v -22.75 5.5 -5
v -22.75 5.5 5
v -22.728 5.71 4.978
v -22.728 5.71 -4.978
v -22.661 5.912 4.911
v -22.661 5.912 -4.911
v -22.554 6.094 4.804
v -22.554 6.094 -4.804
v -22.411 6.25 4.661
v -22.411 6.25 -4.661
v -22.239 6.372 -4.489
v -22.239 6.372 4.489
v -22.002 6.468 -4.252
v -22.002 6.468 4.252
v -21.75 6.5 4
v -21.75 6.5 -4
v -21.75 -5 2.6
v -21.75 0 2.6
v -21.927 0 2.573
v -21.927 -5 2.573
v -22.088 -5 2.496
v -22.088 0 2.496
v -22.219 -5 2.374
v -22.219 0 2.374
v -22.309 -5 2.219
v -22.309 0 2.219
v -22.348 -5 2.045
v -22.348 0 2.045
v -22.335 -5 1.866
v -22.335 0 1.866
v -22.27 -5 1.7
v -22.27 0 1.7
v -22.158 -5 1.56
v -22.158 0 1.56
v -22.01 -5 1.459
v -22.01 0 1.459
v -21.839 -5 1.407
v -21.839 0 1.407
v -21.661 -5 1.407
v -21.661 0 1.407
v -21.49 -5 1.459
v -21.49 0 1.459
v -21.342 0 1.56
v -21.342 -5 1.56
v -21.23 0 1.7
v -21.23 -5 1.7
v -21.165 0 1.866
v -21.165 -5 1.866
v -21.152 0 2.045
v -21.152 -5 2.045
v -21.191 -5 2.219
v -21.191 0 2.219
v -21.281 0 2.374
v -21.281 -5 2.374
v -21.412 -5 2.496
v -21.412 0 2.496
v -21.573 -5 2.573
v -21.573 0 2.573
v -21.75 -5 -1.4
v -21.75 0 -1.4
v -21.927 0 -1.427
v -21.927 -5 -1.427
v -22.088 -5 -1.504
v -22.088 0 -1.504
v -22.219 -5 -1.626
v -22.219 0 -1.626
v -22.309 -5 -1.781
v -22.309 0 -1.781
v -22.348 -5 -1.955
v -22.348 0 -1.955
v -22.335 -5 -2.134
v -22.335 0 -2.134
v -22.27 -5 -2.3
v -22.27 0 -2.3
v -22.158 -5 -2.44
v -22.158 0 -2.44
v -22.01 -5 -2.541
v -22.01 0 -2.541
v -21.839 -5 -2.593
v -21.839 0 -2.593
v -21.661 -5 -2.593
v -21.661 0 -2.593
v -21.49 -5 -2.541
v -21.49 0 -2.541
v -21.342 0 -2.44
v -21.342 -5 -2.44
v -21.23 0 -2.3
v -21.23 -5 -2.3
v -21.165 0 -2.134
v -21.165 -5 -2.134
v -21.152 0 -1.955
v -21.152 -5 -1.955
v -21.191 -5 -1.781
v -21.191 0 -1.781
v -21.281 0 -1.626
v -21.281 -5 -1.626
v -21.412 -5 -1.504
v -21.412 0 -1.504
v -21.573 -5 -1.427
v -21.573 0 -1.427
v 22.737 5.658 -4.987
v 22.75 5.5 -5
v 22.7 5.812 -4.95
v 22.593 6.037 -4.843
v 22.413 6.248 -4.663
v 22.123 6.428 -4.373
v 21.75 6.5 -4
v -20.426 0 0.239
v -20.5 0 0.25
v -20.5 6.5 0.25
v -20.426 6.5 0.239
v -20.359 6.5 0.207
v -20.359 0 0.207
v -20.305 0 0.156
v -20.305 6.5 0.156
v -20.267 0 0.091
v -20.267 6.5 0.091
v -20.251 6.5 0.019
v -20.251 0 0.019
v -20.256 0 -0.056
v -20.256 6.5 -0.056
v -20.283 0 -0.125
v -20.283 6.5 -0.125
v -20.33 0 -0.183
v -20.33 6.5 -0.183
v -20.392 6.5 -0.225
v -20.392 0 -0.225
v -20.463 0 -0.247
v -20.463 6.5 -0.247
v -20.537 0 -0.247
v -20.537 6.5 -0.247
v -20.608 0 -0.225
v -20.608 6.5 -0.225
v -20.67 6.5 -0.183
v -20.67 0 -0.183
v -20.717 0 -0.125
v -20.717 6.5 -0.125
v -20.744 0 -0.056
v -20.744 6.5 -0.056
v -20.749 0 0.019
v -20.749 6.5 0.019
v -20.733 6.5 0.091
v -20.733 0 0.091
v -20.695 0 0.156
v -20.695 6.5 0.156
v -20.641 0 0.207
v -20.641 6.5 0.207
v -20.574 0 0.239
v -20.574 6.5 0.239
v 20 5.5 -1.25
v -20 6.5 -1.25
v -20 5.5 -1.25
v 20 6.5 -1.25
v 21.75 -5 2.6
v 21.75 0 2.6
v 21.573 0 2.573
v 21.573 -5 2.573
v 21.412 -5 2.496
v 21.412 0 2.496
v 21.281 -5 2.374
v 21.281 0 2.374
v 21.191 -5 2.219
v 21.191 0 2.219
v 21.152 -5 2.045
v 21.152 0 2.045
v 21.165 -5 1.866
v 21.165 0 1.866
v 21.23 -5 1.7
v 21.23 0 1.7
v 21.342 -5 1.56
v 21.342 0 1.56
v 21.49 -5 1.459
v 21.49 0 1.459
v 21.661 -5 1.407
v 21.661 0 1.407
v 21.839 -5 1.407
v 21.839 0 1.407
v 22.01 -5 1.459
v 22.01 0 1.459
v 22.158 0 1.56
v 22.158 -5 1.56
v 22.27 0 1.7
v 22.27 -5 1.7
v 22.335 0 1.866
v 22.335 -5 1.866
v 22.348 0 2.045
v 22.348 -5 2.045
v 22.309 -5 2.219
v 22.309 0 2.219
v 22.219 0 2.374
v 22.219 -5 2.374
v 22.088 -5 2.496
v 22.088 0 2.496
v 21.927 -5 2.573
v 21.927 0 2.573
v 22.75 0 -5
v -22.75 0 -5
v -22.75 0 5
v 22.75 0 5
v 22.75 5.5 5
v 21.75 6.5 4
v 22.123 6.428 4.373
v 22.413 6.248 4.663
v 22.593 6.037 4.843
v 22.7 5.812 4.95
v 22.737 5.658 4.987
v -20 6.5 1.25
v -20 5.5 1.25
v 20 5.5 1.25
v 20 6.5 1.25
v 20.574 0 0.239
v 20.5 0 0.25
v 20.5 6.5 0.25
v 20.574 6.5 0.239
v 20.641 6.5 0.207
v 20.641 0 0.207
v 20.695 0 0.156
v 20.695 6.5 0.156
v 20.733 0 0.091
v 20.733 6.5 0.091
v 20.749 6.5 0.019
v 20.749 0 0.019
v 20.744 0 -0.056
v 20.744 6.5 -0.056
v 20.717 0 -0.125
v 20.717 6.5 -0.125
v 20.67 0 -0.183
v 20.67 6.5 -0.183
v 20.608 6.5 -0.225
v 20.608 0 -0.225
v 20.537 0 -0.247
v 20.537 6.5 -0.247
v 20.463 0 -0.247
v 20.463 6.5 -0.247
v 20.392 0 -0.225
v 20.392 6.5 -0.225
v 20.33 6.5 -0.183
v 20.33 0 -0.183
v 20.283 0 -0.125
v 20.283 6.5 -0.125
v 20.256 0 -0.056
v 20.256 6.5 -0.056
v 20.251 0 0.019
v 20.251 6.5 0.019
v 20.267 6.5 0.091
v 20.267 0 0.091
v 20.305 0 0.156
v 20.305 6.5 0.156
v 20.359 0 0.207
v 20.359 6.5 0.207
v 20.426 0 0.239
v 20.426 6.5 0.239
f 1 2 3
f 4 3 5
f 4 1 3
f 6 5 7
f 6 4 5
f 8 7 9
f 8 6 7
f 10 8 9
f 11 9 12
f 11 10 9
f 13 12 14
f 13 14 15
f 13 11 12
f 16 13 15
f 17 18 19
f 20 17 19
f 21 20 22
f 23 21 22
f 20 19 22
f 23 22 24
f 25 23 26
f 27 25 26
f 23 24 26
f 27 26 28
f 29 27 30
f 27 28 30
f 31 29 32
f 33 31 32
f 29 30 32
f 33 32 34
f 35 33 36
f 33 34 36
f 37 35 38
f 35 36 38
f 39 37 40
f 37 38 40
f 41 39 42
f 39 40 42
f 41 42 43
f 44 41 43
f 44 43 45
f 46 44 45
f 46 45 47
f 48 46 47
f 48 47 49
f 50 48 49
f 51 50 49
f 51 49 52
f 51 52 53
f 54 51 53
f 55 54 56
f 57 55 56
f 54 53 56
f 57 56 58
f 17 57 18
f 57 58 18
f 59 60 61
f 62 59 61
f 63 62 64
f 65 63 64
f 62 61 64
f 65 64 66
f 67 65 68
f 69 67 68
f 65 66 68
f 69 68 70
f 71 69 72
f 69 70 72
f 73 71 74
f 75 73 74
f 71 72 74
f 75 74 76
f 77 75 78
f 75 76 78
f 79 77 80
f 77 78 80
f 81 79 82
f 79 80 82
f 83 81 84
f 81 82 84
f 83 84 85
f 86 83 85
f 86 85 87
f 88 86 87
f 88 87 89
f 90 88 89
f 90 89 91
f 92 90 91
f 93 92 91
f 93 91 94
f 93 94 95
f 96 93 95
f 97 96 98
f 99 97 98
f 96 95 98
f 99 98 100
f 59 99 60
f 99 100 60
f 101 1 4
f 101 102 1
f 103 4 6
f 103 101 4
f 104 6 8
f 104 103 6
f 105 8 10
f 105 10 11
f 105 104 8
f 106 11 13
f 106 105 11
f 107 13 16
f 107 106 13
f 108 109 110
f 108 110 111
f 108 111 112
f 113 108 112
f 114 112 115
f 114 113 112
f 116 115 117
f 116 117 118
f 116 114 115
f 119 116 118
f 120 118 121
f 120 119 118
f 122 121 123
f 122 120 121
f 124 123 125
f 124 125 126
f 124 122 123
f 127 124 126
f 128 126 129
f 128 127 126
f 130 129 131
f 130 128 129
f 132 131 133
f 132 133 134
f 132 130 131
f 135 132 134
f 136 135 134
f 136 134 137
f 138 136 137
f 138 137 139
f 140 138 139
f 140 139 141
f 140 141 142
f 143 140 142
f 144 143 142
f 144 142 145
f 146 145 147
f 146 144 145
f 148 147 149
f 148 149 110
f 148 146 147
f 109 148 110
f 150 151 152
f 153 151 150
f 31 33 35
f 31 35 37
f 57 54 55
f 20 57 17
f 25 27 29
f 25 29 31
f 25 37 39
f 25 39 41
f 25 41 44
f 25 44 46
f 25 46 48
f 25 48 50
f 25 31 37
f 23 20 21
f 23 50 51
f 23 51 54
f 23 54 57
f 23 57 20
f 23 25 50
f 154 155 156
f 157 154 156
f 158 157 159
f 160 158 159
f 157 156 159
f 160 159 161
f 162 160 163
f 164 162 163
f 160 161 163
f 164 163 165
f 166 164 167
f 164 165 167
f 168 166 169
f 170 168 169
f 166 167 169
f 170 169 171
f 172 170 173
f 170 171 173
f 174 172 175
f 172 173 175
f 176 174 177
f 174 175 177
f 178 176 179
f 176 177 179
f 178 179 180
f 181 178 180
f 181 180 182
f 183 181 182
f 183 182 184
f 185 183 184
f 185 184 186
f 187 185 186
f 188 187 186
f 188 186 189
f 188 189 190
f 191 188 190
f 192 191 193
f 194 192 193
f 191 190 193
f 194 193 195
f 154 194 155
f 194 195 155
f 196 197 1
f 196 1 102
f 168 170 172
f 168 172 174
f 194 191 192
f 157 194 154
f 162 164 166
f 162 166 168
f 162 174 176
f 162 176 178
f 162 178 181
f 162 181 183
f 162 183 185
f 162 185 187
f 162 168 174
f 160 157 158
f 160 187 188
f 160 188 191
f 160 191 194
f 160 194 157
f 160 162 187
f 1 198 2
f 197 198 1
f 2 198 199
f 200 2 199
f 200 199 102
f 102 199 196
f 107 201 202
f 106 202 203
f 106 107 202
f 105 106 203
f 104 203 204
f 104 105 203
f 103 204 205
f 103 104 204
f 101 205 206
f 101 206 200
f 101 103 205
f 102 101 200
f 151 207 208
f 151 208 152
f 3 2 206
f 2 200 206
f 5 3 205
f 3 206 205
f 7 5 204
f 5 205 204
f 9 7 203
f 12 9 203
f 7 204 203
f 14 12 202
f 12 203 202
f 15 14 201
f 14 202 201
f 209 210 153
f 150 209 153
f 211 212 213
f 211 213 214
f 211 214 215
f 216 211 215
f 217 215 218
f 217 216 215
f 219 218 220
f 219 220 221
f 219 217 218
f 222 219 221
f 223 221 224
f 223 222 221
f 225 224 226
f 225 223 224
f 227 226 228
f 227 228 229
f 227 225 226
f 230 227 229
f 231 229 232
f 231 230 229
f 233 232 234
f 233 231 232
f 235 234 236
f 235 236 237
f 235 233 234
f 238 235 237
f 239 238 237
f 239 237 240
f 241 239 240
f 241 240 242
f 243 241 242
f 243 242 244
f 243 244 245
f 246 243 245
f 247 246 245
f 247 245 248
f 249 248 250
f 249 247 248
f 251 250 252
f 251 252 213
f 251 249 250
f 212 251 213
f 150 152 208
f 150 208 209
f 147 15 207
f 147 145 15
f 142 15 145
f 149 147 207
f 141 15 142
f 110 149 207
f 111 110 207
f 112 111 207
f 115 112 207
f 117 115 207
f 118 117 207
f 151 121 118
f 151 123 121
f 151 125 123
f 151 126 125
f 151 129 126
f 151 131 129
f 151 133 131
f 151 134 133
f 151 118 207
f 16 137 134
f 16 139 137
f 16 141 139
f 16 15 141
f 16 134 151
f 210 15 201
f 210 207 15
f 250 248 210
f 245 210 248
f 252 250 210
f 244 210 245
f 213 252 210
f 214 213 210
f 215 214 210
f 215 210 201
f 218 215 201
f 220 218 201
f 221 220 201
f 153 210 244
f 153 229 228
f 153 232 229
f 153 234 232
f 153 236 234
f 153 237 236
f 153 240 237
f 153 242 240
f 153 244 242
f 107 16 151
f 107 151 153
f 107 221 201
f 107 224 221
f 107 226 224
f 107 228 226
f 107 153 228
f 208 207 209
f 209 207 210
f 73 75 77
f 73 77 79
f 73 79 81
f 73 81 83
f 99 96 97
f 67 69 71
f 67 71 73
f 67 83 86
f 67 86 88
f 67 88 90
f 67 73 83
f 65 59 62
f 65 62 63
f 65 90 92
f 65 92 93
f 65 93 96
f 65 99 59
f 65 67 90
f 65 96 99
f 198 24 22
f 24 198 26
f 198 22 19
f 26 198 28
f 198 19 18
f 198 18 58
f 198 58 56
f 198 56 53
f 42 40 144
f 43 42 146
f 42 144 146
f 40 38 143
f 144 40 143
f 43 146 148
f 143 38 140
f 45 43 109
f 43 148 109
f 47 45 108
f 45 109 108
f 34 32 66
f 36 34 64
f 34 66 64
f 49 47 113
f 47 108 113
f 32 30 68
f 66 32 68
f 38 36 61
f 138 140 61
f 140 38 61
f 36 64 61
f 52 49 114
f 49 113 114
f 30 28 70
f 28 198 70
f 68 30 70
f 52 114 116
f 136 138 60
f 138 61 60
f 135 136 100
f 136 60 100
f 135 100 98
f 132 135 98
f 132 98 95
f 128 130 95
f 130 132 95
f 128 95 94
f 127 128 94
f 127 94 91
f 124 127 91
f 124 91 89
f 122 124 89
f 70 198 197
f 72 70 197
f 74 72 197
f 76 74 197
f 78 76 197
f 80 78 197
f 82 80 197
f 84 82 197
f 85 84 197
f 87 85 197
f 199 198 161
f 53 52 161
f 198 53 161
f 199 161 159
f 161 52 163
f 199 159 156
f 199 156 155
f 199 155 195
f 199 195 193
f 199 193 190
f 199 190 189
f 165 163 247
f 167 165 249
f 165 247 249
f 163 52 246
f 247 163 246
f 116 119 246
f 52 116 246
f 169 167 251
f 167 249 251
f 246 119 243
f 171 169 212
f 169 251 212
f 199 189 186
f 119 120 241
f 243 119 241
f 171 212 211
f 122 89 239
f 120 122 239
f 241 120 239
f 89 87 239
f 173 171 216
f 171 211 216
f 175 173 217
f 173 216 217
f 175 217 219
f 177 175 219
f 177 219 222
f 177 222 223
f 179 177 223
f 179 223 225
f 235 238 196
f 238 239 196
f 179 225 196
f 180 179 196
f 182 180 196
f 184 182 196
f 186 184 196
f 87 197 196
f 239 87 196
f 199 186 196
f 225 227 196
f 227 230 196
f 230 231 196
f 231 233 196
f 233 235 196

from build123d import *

# Parameters (mm, degrees)
SKETCH1_W           = 45.5
SKETCH1_H           = 10
SKETCH1_R           = 0.25
BOSS_EXTRUDE1_DEPTH = 6.5
SKETCH2_R           = 0.6
BOSS_EXTRUDE2_DEPTH = 5
SKETCH4_W           = 40
SKETCH4_H           = 2.5
CUT_EXTRUDE1_DEPTH  = 1
FILLET1_R           = 1


with BuildPart() as part:
    # Sketch1 → Boss-Extrude1 (new body)
    with BuildSketch(Plane(origin=(0, 0, 0), x_dir=(1, 0, 0), z_dir=(0, 1, 0))):
        Rectangle(SKETCH1_W, SKETCH1_H)
        with Locations(Location((-20.5, 0, 0), (0, 0, 270))):
            Circle(SKETCH1_R, mode=Mode.SUBTRACT)
        with Locations(Location((20.5, 0, 0), (0, 0, 270))):
            Circle(SKETCH1_R, mode=Mode.SUBTRACT)
    extrude(amount=BOSS_EXTRUDE1_DEPTH)

    # Sketch2 → Boss-Extrude2 (add)
    with BuildSketch(Plane.XZ):
        with Locations(Location((-21.75, 2, 0), (0, 0, 90))):
            Circle(SKETCH2_R)
        with Locations(Location((-21.75, -2, 0), (0, 0, 90))):
            Circle(SKETCH2_R)
        with Locations(Location((21.75, 2, 0), (0, 0, 90))):
            Circle(SKETCH2_R)
    extrude(amount=BOSS_EXTRUDE2_DEPTH)

    # Sketch4 → Cut-Extrude1 (cut)
    with BuildSketch(Plane(origin=(0, 6.5, 0), x_dir=(1, 0, 0), z_dir=(0, 1, 0))):
        Rectangle(SKETCH4_W, SKETCH4_H)
    extrude(amount=-CUT_EXTRUDE1_DEPTH, mode=Mode.SUBTRACT)

    # Fillet1
    fillet1_edges = [part.edges().sort_by_distance(p)[0] for p in [
        (22.75, 6.5, 0),
        (0, 6.5, -5),
        (-22.75, 6.5, 0),
        (0, 6.5, 5),
    ]]
    fillet(fillet1_edges, radius=FILLET1_R)


solid = part.part
